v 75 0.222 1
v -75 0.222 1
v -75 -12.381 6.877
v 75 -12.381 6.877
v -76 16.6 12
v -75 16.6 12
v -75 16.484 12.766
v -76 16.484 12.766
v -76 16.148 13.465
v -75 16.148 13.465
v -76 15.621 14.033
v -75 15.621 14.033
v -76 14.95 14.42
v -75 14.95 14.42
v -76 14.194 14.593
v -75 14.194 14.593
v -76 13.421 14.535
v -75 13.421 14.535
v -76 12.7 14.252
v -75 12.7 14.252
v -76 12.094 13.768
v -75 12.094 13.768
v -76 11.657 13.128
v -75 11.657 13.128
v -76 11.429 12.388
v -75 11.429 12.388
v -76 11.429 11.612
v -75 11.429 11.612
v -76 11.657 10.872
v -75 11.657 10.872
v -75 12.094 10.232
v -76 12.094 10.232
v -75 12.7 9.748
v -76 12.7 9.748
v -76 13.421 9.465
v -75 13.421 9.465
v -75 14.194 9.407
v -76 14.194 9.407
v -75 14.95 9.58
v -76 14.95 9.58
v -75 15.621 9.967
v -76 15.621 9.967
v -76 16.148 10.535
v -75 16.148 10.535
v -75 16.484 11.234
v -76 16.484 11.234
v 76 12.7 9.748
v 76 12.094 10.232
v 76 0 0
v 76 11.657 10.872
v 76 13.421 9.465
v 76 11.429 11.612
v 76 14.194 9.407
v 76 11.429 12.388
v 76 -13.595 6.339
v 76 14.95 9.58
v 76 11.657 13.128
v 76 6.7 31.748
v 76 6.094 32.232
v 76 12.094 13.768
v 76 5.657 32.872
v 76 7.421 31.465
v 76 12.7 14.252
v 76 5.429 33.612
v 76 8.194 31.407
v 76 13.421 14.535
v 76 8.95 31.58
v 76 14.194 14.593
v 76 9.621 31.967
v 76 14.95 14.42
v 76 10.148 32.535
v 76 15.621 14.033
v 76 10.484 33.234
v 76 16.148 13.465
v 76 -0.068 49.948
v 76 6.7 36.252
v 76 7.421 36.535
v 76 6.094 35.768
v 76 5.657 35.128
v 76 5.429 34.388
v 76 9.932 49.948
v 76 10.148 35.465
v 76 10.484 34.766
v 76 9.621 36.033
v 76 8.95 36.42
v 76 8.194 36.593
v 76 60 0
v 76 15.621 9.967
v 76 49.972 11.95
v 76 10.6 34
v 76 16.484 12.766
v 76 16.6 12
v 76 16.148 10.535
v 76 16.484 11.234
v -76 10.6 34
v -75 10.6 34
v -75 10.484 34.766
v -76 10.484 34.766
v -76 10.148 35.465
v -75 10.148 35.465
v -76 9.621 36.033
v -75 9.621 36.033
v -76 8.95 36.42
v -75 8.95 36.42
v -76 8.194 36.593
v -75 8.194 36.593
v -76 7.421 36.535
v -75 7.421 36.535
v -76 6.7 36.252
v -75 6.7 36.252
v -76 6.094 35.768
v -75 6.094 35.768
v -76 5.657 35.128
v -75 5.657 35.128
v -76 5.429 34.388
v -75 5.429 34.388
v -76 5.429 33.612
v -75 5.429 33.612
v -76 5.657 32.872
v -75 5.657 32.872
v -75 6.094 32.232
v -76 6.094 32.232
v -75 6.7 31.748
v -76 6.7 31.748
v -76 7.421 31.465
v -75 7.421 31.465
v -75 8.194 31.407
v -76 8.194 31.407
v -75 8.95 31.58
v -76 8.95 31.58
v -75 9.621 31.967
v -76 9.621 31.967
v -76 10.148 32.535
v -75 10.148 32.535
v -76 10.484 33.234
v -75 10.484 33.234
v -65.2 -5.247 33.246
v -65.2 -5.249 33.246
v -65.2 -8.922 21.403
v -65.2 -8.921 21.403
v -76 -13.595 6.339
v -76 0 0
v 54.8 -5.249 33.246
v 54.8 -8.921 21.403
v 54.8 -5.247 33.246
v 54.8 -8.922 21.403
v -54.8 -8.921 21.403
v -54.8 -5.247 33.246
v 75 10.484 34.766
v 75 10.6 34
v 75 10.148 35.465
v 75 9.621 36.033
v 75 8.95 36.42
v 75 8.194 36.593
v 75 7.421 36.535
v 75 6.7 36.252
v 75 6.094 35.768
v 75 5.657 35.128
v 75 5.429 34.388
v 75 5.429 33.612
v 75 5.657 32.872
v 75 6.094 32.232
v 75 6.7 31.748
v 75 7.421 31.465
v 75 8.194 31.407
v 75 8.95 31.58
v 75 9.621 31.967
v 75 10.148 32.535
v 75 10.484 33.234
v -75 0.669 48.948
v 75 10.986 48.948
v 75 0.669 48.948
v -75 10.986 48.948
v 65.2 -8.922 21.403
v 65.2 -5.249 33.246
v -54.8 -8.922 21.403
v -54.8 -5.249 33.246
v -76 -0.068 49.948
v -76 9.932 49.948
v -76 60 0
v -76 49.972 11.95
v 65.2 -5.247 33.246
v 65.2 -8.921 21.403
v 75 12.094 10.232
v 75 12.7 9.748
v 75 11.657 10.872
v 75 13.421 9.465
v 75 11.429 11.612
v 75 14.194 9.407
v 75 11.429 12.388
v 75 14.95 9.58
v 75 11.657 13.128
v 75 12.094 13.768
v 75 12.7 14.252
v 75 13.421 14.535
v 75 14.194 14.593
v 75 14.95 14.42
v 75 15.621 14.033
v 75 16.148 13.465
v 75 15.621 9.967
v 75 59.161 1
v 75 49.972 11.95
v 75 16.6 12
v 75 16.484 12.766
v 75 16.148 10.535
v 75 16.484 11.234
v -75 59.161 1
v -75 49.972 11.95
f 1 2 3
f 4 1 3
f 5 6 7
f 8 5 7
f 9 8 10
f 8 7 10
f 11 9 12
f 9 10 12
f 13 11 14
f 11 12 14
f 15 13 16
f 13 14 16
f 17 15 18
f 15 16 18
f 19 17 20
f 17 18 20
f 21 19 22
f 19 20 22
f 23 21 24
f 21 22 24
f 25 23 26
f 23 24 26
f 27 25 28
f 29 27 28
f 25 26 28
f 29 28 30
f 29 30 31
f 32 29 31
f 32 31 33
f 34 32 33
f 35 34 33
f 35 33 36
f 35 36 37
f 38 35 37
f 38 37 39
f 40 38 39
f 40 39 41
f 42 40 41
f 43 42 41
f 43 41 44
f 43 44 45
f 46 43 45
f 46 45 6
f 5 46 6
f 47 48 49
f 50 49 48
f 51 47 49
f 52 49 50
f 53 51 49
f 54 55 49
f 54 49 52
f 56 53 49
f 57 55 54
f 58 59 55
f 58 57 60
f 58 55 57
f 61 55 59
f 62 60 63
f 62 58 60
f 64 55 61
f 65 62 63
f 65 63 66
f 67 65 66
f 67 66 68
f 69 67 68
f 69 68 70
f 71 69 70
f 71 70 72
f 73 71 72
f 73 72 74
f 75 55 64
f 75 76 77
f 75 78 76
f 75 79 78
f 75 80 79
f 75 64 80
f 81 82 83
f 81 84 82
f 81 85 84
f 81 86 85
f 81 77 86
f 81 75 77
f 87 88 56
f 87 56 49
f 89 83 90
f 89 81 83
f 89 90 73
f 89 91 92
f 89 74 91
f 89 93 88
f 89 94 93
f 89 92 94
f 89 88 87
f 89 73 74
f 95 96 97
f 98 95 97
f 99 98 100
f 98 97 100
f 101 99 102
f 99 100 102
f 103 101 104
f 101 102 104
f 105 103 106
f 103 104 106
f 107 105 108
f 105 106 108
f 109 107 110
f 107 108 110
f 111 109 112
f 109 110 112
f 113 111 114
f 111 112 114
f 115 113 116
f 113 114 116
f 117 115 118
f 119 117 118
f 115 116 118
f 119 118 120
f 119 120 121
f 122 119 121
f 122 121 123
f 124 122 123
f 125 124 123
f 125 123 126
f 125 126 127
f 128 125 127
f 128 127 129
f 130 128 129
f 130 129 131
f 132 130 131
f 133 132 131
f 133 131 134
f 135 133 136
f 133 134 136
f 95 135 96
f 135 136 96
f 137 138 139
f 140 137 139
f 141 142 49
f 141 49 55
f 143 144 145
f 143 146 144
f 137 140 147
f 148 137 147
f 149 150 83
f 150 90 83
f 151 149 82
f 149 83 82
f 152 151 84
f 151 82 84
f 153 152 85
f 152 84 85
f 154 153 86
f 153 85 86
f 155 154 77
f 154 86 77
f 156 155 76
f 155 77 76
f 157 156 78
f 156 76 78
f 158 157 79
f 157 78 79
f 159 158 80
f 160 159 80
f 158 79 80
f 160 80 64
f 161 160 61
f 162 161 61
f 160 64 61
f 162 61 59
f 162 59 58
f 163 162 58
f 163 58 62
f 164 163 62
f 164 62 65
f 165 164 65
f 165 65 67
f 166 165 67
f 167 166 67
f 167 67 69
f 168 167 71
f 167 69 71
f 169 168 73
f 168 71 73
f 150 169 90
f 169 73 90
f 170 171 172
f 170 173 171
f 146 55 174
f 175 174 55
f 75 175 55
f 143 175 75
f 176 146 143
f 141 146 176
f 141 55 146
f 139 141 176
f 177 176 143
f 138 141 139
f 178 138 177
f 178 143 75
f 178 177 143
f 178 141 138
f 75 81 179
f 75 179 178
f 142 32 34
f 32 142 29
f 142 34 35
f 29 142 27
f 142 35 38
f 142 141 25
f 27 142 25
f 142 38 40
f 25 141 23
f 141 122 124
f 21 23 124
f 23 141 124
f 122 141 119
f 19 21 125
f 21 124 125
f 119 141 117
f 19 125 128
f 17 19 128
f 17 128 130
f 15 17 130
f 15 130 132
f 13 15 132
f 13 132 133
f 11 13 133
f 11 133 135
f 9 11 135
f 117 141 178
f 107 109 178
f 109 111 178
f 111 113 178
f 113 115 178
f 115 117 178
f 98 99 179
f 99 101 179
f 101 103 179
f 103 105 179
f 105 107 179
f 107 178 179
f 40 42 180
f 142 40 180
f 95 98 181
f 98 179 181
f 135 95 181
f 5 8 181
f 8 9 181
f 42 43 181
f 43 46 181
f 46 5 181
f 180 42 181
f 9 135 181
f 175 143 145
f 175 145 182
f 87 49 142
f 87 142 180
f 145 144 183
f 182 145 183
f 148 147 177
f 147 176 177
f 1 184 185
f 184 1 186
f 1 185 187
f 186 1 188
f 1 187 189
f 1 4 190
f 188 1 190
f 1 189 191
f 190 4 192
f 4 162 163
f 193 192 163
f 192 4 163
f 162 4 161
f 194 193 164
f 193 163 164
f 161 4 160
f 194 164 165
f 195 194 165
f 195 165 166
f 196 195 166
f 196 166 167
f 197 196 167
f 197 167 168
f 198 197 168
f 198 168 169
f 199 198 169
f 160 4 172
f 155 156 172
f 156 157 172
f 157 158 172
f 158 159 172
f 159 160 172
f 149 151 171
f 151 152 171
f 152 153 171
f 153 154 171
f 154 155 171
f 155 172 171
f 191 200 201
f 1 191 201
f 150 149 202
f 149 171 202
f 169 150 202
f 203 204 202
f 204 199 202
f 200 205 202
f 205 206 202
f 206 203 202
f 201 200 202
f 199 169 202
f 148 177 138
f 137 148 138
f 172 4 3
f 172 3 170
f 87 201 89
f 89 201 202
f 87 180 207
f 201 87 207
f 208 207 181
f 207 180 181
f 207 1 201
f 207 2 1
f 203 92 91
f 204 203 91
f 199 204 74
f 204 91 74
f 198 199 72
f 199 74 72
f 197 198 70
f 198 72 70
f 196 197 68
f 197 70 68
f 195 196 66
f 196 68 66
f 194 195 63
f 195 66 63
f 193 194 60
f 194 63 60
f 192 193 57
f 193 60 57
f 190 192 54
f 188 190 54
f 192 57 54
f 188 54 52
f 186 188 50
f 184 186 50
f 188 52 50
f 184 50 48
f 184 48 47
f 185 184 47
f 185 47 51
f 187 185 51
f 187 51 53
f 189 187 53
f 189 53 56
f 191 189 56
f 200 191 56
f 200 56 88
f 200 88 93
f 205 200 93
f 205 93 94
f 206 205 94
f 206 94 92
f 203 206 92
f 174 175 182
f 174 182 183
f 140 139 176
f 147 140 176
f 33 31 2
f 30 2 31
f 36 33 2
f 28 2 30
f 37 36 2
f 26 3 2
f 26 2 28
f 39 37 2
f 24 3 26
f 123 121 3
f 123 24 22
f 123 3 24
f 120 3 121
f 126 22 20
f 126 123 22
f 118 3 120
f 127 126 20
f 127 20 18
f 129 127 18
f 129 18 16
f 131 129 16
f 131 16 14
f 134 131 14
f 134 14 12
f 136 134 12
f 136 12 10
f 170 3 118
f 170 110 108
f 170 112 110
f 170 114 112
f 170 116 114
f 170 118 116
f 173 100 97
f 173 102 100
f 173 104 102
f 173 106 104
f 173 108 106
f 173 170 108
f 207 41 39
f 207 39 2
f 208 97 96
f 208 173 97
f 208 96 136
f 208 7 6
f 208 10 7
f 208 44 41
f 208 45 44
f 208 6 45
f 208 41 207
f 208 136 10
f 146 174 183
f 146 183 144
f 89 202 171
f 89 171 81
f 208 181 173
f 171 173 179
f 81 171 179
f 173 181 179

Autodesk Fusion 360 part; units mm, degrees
sketch "Sketch1" plane through (0, 0, 0) normal (1, 0, 0) x (0, 1, 0)
  line L0 (0, 0) -> (60, 0)
  line L1 (60, 0) -> (49.9725, 11.9503)
  line L2 (49.9725, 11.9503) -> (9.9318, 49.9475)
  line L3 (49.9725, 11.9503) -> (105.1725, 11.9503) construction
  line L4 (9.9318, 49.9475) -> (-0.0682, 49.9475)
  line L5 (0, 0) -> (-13.5946, 6.3393)
  line L6 (0, 0) -> (15, 0) construction
  line L7 (-13.5946, 6.3393) -> (-0.0682, 49.9475)
  dimension "d15" = 60
  dimension "d16" = 15.6
  dimension "d18" = 136.5
  dimension "d19" = 55.2
  dimension "d24" = 155
  dimension "d25" = 15
extrude "Extrude1" add sketch "Sketch1" along normal mid plane 152
shell "Shell1" thickness 1 removed faces 2 at (25.3333, 23.2787, 37.2817) at (25.3333, 56.6575, 3.9834)
sketch "Sketch3" plane through (0, -14.1952, 4.4031) normal (0, -0.9551, 0.2963) x (1, 0, 0)
  line L0 (-76, 2.0272) -> (76, 2.0272)
  line L1 (76, 2.0272) -> (76, 47.685)
  line L2 (76, 47.685) -> (-76, 47.685)
  line L3 (-76, 47.685) -> (-76, 2.0272)
  line L4 (0, 2.0272) -> (0, 47.685)
  line L5 (-69, 24.0272) -> (-69, 33.0272)
  line L6 (-69, 24.0272) -> (-69, 15.0272)
  line L7 (-69, 33.0272) -> (-51, 33.0272)
  line L8 (-51, 33.0272) -> (-51, 15.0272)
  line L9 (-51, 15.0272) -> (-69, 15.0272)
  line L10 (69, 33.0272) -> (51, 33.0272)
  line L11 (51, 33.0272) -> (51, 15.0272)
  line L12 (51, 15.0272) -> (69, 15.0272)
  line L13 (69, 24.0272) -> (69, 15.0272)
  line L14 (69, 24.0272) -> (69, 33.0272)
extrude "Extrude3" add sketch "Sketch3" along normal blind 28 contours L5 L6 L7 L8 L9 | L10 L11 L12 L13 L14
sketch "Sketch4" plane through (0, -40.9382, 12.6983) normal (0, -0.9551, 0.2963) x (1, 0, 0)
  line L0 (-69, 33.0272) -> (-69, 15.0272)
  line L1 (-69, 15.0272) -> (-51, 15.0272)
  line L2 (-51, 15.0272) -> (-51, 33.0272)
  line L3 (-51, 33.0272) -> (-69, 33.0272)
  line L4 (-54.8, 30.2) -> (-65.2, 30.2)
  line L5 (-65.2, 30.2) -> (-65.2, 17.8)
  line L6 (-65.2, 17.8) -> (-54.8, 17.8)
  line L7 (-54.8, 17.8) -> (-54.8, 30.2)
  line L8 (-54.8, 30.2) -> (-65.2, 17.8) construction
  line L9 (-65.2, 30.2) -> (-54.8, 17.8) construction
  line L10 (54.8, 30.2) -> (65.2, 17.8) construction
  line L11 (65.2, 30.2) -> (54.8, 17.8) construction
  line L12 (65.2, 30.2) -> (65.2, 17.8)
  line L13 (65.2, 17.8) -> (54.8, 17.8)
  line L14 (54.8, 17.8) -> (54.8, 30.2)
  line L15 (54.8, 30.2) -> (65.2, 30.2)
  point P0 (-60, 24)
  point P1 (60, 24)
  dimension "d50" = 10.4
  dimension "d51" = 12.4
extrude "Extrude4" cut sketch "Sketch4" against normal blind 28.2 contours L4 L5 L6 L7 | L12 L13 L14 L15
delete_face "DeleteFace1" 10 faces at (69, -16.8801, 27.2514) (57, -18.6576, 21.5207) (52.2667, -33.2104, 37.6121) (63, -22.2393, 41.4778) (51, -25.7944, 30.0165) (-69, -16.8801, 27.2514) (-57, -18.6576, 21.5207) (-52.2667, -33.2104, 37.6121) (-63, -13.325, 38.7127) (-51, -25.7944, 30.0165)
extrude "Extrude5" add 2 faces at (61.7333, -7.5063, 25.2925) (-58.2667, -7.5063, 25.2925) along direction (0, -0.955108, 0.296257) blind 0.2
sketch "Sketch5" plane through (76, 0, 0) normal (1, 0, 0) x (0, 1, 0)
  line L0 (0, 0) -> (60, 0)
  line L1 (60, 0) -> (49.9725, 11.9503)
  line L2 (49.9725, 11.9503) -> (9.9318, 49.9475)
  line L3 (9.9318, 49.9475) -> (-0.0682, 49.9475)
  line L4 (-0.0682, 49.9475) -> (-13.5946, 6.3393)
  line L5 (-13.5946, 6.3393) -> (0, 0)
  circle A0 centre (14, 12) radius 2.6
  circle A1 centre (8, 34) radius 2.6
  dimension "d58" = 5.2
  dimension "d60" = 5.2
extrude "Extrude6" cut sketch "Sketch5" against normal through all contours A0 | A1
extrude "Extrude2" [suppressed]
equation "bucket_width = 152 mm"
equation "bucket_depth = 60 mm"
equation "bucket_back_height = 50 mm"
equation "wall = 4.5 mm"
equation "side_wall = 5.5 mm"
equation "lip = 7 mm"
equation "pivot_ear_thickness = 6 mm"
equation "pivot_hole = 5 mm"
equation "top_flange = 8 mm"
